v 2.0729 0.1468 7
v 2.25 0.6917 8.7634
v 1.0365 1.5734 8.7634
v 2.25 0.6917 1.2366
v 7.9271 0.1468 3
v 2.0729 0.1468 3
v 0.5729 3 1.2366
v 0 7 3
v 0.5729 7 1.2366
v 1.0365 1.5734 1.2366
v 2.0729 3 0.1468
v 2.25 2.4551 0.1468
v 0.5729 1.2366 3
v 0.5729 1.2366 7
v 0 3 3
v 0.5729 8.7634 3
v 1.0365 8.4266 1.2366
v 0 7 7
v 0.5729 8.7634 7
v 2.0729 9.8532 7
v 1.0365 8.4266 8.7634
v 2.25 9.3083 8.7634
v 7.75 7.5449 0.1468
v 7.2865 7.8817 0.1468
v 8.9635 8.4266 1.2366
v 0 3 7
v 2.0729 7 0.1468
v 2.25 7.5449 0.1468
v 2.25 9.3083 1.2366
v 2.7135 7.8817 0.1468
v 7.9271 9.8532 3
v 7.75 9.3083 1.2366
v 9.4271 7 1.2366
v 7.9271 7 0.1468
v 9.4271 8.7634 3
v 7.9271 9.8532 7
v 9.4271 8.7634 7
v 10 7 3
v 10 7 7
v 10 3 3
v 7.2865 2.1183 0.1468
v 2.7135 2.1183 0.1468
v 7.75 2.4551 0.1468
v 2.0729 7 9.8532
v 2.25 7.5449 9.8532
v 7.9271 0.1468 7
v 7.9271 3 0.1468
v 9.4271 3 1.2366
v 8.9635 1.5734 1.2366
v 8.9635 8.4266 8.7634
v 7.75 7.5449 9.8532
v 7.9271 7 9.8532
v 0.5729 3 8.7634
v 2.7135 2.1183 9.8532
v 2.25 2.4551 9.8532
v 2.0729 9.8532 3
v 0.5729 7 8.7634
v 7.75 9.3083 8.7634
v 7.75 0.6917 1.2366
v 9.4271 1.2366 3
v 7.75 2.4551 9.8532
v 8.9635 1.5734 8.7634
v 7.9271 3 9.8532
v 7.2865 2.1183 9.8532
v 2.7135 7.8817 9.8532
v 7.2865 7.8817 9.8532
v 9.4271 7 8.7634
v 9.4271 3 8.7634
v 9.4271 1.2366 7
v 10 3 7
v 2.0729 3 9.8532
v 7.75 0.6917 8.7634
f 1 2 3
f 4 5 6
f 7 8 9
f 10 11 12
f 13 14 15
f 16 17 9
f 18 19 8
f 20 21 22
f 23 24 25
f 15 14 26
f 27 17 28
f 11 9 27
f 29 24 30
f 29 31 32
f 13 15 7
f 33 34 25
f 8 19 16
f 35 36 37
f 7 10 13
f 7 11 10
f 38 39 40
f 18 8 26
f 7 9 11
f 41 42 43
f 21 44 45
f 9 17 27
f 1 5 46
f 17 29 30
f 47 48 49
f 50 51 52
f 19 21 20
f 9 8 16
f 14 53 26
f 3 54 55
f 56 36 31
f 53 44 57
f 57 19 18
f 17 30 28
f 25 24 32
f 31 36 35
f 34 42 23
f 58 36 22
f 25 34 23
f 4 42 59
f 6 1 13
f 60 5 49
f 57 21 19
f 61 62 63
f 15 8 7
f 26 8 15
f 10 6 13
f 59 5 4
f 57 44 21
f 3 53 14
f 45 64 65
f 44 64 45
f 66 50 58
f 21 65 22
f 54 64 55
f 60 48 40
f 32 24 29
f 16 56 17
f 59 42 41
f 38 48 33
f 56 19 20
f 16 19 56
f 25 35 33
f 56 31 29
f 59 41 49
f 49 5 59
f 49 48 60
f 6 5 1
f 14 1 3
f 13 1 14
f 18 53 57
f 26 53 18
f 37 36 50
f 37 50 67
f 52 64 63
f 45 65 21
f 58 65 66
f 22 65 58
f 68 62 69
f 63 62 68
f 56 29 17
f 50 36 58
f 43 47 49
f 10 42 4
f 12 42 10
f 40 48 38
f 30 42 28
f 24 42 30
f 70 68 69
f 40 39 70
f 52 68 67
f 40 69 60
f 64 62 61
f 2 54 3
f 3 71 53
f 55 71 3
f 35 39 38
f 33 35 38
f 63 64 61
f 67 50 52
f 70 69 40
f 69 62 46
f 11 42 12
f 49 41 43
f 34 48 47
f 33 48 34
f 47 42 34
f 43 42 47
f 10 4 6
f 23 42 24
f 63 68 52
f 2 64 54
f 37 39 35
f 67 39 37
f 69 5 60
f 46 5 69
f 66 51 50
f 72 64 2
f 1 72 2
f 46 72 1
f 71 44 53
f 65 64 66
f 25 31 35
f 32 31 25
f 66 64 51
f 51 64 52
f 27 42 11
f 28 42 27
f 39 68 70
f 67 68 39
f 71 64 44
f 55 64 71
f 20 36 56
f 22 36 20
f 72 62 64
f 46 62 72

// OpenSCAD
campher = 3;

translate( [ campher, campher, campher ] )
minkowski() {
    cube( [ 10 - 2 * campher, 10 - 2 * campher, 10 - 2 * campher ] );
    sphere( r=campher );
}
